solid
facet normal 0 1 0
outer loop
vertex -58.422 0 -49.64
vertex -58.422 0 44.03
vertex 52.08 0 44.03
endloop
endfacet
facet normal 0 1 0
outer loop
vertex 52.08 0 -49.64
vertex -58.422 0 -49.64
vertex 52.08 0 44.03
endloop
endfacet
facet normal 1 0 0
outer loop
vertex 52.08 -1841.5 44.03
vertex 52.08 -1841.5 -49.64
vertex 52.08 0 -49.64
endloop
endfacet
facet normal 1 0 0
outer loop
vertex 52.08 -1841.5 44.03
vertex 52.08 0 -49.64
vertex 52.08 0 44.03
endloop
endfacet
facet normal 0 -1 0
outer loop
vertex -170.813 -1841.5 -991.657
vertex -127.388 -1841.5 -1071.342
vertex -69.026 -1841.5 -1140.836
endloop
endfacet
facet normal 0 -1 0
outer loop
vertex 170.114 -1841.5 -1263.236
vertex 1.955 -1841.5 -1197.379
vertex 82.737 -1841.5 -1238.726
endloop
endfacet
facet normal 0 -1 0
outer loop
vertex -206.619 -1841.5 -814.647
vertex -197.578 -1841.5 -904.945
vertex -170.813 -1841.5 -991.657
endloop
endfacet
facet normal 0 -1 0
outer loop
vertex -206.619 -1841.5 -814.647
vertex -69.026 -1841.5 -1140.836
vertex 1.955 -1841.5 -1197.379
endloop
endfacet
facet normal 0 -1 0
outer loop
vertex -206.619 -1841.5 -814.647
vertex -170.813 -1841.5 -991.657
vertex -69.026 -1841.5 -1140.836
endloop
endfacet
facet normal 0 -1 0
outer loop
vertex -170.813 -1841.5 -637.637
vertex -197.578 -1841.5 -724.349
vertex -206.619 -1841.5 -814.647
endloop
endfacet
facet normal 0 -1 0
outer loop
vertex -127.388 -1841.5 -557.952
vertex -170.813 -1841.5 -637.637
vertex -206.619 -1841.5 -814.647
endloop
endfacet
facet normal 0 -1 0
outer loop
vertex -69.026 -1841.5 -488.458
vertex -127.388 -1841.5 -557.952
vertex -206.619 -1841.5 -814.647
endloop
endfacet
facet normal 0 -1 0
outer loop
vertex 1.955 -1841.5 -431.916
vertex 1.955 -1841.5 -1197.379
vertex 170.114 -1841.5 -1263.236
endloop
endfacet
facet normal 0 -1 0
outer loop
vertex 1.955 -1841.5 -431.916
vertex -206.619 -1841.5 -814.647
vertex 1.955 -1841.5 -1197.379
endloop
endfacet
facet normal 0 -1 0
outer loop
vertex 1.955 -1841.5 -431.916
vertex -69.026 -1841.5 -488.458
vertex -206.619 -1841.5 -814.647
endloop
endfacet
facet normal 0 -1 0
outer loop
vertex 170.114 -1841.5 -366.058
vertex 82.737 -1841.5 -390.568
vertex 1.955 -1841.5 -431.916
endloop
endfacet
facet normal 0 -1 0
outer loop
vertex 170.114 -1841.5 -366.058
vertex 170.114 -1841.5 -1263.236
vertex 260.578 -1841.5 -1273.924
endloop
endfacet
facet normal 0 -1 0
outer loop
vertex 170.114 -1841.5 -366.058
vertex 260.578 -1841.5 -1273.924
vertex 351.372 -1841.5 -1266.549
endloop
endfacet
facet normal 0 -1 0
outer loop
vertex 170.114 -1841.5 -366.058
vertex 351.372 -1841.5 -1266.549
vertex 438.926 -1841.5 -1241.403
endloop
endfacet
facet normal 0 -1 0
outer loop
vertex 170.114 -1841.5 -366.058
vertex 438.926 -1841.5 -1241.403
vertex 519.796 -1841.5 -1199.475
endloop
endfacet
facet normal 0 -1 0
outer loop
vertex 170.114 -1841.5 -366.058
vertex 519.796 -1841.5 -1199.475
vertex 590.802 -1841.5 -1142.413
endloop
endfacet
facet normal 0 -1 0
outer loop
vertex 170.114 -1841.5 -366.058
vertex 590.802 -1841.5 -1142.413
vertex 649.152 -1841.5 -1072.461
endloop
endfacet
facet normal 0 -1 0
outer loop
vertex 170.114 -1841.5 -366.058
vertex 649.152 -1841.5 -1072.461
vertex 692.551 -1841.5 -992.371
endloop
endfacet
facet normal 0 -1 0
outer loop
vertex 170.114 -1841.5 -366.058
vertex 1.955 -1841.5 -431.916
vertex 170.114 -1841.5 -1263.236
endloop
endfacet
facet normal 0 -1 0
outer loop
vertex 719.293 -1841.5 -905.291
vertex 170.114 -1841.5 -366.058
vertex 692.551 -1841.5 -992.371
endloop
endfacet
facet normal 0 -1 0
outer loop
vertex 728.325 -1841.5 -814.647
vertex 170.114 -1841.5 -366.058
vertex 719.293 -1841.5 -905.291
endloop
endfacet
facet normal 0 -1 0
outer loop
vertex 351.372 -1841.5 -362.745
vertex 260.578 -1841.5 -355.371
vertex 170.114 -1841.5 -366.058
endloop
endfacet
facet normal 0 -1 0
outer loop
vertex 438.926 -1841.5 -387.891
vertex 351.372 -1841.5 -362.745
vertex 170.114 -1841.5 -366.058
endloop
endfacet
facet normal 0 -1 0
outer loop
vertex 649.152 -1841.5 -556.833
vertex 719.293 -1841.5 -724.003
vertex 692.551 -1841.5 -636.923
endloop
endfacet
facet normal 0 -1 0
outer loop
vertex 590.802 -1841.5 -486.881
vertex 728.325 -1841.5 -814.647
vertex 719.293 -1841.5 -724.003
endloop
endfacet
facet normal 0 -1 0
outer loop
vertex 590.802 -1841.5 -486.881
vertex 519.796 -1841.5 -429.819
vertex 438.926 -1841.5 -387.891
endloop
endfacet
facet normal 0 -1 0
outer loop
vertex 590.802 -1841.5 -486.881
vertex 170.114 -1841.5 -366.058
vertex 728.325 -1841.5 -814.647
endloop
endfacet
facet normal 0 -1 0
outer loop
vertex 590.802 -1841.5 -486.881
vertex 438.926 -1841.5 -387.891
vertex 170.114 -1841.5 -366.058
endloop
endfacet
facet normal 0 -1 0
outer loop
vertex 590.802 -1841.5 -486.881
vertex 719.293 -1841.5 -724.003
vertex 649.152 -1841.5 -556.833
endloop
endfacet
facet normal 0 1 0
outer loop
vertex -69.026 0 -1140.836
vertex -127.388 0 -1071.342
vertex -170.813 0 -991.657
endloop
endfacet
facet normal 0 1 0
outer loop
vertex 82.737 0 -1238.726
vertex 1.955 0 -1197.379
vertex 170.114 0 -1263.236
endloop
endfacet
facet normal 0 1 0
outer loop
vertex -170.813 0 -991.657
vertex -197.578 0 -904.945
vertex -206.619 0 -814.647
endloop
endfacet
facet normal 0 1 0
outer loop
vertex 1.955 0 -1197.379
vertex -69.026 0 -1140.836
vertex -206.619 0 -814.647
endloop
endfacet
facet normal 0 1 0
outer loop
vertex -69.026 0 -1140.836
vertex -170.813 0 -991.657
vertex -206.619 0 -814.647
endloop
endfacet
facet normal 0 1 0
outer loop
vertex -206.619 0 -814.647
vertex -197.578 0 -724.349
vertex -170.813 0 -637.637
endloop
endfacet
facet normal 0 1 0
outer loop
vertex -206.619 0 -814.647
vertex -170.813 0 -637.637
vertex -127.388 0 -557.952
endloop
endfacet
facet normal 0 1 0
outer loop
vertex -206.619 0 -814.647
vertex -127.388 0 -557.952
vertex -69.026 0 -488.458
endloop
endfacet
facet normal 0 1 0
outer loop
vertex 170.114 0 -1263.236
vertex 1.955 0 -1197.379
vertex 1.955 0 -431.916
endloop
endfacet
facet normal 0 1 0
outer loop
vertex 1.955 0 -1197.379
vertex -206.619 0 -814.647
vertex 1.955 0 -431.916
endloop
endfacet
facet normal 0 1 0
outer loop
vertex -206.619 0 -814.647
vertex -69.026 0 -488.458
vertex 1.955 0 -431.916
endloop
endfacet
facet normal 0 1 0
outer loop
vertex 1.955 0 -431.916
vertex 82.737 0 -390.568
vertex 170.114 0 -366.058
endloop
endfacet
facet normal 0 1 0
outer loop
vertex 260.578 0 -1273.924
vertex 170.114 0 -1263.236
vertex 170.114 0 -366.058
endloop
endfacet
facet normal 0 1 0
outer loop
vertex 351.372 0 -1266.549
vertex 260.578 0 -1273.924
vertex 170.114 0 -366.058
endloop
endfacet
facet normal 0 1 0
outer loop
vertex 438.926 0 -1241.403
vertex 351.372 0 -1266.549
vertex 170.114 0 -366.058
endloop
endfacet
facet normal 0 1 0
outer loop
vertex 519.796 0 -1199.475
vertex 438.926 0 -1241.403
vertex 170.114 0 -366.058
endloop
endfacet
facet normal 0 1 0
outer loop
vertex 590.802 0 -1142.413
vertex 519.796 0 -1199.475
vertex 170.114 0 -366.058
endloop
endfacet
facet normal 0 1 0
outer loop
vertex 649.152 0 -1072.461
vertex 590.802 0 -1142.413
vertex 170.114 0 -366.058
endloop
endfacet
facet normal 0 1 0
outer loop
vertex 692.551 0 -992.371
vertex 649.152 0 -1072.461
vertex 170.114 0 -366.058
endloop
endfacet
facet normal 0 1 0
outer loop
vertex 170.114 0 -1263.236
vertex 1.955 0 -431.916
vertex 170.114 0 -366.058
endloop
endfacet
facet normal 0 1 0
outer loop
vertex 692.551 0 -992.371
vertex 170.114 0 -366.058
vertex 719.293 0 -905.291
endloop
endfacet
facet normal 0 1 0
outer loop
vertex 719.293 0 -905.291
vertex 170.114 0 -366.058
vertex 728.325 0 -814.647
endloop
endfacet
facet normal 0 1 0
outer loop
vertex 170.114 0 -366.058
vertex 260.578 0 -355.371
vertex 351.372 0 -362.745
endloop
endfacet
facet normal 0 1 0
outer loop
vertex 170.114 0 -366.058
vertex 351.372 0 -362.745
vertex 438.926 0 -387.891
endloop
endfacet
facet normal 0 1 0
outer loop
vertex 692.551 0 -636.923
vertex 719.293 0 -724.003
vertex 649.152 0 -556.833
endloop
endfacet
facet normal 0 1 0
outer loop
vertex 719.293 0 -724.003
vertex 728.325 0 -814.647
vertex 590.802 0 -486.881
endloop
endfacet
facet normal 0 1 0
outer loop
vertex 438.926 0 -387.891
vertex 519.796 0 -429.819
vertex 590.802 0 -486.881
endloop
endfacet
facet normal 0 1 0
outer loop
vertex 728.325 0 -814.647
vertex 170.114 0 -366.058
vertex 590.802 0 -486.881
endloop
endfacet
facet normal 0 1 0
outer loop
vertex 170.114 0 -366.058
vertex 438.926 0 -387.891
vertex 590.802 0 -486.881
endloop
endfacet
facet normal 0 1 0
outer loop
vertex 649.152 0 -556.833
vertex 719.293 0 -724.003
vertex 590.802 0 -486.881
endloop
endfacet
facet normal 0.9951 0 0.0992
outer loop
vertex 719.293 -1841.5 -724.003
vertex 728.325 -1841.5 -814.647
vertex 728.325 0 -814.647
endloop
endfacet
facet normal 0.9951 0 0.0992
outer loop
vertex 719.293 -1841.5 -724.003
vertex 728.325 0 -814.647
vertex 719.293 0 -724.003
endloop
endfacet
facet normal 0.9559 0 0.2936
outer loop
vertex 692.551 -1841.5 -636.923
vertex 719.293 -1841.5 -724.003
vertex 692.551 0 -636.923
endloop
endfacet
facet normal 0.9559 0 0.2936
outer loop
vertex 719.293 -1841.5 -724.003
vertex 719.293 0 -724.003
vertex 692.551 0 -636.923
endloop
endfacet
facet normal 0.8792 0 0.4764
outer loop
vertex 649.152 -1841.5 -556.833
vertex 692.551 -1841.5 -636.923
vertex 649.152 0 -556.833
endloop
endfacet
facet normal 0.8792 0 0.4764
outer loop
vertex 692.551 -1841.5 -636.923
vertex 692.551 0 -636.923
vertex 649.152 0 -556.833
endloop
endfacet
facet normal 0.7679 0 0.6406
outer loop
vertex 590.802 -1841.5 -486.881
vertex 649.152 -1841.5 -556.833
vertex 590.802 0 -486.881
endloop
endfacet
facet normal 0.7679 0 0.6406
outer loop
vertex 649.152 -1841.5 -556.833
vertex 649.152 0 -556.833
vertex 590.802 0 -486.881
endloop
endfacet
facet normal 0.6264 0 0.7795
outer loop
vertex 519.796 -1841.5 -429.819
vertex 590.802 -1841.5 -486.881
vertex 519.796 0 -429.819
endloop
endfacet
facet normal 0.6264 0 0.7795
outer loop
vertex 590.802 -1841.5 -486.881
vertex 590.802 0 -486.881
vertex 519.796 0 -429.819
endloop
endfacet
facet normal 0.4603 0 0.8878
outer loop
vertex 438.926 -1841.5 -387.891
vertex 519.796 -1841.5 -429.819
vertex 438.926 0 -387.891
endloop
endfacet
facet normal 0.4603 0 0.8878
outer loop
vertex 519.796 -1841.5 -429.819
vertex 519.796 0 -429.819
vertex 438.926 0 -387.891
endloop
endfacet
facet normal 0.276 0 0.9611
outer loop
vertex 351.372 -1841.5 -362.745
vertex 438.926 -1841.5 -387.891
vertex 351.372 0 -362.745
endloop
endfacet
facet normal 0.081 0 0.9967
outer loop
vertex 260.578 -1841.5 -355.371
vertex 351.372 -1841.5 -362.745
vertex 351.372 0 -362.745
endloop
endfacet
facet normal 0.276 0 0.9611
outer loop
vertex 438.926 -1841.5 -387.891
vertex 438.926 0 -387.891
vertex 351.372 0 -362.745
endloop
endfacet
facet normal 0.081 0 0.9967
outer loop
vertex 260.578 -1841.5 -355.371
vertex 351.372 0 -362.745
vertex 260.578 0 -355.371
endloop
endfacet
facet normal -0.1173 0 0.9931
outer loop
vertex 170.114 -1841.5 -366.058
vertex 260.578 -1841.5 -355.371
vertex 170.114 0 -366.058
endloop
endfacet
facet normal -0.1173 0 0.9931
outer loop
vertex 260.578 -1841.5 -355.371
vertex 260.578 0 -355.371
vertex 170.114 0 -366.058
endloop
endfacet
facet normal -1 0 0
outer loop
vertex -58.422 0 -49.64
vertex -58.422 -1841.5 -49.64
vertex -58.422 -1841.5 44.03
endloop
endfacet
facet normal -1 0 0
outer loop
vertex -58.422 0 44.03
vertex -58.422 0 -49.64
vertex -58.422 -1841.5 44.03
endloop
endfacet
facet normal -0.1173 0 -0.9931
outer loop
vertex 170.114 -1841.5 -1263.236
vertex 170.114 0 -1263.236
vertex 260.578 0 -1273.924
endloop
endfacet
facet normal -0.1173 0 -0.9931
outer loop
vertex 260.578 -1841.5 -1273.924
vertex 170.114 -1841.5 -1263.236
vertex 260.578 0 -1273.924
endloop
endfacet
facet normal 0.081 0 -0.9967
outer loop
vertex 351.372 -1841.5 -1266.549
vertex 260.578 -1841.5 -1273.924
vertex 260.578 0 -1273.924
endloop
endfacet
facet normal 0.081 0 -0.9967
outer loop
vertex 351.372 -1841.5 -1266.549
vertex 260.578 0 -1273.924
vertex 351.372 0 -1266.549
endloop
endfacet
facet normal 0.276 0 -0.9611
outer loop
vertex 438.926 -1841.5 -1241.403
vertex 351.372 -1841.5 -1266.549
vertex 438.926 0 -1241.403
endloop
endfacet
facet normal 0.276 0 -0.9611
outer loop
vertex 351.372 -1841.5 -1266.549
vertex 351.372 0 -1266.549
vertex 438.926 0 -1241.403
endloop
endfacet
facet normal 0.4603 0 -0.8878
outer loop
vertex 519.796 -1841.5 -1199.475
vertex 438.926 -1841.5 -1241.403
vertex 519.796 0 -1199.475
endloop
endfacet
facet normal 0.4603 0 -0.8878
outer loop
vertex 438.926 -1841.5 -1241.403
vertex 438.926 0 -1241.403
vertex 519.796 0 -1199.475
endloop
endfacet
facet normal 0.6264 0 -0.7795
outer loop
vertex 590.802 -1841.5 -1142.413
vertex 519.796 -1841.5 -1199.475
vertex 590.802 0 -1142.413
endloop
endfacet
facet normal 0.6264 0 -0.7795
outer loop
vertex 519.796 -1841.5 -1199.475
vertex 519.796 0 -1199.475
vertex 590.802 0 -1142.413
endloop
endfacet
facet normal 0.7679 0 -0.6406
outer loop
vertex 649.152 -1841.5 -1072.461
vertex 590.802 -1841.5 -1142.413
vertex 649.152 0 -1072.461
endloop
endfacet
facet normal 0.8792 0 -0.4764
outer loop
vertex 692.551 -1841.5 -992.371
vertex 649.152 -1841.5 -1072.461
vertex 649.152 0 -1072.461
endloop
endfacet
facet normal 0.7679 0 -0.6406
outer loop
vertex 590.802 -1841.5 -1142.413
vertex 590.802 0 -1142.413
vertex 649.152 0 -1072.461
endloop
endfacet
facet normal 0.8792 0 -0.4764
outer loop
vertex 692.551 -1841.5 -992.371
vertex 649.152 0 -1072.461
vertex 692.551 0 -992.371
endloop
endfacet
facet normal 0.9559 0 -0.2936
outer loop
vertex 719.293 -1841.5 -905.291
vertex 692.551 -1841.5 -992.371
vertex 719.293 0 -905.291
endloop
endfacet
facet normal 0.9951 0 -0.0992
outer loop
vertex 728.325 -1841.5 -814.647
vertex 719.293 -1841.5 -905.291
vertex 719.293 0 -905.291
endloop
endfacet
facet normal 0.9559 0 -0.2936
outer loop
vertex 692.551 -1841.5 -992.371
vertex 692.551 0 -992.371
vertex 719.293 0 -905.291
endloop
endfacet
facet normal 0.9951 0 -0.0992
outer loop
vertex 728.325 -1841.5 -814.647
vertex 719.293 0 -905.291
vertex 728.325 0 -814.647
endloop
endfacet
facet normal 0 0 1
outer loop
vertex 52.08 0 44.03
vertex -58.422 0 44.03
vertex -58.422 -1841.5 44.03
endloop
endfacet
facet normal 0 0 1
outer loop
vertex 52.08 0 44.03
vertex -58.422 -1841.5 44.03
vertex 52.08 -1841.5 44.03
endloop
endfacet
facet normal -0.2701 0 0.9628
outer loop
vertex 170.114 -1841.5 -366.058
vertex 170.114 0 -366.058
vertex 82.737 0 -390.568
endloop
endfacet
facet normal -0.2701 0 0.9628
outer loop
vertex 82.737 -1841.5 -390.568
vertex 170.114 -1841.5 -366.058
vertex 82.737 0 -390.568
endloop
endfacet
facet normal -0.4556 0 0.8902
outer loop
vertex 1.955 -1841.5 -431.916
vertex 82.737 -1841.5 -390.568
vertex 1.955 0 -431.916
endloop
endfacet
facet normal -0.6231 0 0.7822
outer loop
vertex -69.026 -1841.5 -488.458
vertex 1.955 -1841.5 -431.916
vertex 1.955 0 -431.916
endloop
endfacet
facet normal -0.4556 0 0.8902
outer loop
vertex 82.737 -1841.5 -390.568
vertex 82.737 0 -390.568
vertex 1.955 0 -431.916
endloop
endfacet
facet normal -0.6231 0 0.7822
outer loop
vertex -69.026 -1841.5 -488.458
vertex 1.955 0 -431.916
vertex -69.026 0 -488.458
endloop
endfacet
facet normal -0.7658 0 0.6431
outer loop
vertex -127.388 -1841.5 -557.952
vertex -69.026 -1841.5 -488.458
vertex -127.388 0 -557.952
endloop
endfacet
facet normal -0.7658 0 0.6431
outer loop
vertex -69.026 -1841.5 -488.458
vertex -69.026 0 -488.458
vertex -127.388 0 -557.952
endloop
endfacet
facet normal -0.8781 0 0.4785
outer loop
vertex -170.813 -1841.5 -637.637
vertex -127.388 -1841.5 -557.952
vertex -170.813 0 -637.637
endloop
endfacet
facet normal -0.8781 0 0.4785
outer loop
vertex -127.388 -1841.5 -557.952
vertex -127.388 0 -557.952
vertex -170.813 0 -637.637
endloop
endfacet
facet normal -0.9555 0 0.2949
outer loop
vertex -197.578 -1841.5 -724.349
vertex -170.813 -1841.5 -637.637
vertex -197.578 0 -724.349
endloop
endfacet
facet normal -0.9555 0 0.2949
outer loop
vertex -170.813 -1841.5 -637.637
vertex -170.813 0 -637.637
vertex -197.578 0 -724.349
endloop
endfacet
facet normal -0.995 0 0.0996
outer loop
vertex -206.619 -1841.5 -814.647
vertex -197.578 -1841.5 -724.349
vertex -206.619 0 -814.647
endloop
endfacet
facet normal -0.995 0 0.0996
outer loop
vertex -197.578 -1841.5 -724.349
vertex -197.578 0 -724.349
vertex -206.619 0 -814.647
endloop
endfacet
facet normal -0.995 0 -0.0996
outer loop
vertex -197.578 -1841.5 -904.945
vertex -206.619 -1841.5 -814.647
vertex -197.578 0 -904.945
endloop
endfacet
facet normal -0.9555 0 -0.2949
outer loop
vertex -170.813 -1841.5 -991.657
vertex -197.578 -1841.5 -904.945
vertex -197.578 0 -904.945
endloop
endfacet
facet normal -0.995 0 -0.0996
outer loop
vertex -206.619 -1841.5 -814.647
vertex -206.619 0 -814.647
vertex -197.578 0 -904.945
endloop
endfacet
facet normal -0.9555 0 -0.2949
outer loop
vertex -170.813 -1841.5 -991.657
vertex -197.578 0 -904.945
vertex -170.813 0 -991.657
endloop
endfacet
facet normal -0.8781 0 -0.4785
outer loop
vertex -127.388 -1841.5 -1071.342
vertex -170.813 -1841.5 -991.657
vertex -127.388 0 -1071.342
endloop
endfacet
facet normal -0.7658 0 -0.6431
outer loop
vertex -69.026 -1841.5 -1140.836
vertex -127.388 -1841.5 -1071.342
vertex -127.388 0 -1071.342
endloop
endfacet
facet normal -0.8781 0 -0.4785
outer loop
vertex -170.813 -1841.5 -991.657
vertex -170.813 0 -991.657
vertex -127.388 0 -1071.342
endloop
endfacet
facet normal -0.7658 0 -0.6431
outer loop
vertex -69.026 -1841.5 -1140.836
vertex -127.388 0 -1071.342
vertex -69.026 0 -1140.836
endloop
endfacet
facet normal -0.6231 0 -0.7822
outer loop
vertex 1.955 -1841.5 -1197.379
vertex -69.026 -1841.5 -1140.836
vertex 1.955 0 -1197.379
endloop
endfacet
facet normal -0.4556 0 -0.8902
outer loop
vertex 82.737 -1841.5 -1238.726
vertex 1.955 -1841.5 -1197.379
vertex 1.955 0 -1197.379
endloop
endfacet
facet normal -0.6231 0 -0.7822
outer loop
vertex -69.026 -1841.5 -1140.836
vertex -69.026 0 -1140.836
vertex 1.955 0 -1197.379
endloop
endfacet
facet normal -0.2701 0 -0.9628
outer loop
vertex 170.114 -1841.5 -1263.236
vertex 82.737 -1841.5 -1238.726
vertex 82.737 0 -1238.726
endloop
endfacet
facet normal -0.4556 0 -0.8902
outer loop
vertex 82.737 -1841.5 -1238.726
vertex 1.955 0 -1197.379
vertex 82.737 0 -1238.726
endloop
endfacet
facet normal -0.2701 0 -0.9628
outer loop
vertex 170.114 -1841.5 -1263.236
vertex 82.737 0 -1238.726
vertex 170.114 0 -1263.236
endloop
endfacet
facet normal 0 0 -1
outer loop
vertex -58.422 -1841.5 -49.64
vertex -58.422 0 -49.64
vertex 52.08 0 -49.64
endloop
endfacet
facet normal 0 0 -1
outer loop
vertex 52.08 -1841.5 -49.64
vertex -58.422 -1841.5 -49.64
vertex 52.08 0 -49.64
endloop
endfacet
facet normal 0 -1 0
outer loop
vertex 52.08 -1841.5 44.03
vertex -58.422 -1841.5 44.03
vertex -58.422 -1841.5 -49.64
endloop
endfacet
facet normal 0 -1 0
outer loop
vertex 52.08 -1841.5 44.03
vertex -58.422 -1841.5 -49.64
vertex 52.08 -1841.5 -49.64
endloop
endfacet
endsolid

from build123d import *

# Parameters (mm, degrees)
F0_W     = 110.501614
F0_H     = 93.670245
F0_R     = 417.69557
F1_DEPTH = 1841.5


with BuildPart() as f1:
    # F0 (on Front) → F1 (new body)
    with BuildSketch(Plane.XZ):
        with Locations((-3.171129, -2.805228)):
            Rectangle(F0_W, F0_H)
        with BuildLine():
            ThreePointArc((170.113577, -1263.236372), (-190.381415, -814.647019), (170.113577, -366.057666))
            ThreePointArc((170.113577, -366.057666), (-206.618711, -814.647019), (170.113577, -1263.236372))
        make_face()
        with BuildLine():
            ThreePointArc((170.113577, -366.057666), (541.722708, -465.88096), (704.265848, -814.647019))
            ThreePointArc((704.265848, -814.647019), (541.722708, -1163.413078), (170.113577, -1263.236372))
            ThreePointArc((170.113577, -1263.236372), (556.716904, -1172.708589), (728.324957, -814.647019))
            ThreePointArc((728.324957, -814.647019), (556.716904, -456.585448), (170.113577, -366.057666))
        make_face()
        with BuildLine():
            ThreePointArc((170.113577, -1263.236372), (541.722708, -1163.413078), (704.265848, -814.647019))
            ThreePointArc((704.265848, -814.647019), (541.722708, -465.88096), (170.113577, -366.057666))
            ThreePointArc((170.113577, -366.057666), (-190.381415, -814.647019), (170.113577, -1263.236372))
        make_face()
        with Locations((248.823568, -814.647019)):
            Circle(F0_R, mode=Mode.SUBTRACT)
        with Locations((248.823568, -814.647019)):
            Circle(F0_R)
    extrude(amount=F1_DEPTH)


solid = f1.part
